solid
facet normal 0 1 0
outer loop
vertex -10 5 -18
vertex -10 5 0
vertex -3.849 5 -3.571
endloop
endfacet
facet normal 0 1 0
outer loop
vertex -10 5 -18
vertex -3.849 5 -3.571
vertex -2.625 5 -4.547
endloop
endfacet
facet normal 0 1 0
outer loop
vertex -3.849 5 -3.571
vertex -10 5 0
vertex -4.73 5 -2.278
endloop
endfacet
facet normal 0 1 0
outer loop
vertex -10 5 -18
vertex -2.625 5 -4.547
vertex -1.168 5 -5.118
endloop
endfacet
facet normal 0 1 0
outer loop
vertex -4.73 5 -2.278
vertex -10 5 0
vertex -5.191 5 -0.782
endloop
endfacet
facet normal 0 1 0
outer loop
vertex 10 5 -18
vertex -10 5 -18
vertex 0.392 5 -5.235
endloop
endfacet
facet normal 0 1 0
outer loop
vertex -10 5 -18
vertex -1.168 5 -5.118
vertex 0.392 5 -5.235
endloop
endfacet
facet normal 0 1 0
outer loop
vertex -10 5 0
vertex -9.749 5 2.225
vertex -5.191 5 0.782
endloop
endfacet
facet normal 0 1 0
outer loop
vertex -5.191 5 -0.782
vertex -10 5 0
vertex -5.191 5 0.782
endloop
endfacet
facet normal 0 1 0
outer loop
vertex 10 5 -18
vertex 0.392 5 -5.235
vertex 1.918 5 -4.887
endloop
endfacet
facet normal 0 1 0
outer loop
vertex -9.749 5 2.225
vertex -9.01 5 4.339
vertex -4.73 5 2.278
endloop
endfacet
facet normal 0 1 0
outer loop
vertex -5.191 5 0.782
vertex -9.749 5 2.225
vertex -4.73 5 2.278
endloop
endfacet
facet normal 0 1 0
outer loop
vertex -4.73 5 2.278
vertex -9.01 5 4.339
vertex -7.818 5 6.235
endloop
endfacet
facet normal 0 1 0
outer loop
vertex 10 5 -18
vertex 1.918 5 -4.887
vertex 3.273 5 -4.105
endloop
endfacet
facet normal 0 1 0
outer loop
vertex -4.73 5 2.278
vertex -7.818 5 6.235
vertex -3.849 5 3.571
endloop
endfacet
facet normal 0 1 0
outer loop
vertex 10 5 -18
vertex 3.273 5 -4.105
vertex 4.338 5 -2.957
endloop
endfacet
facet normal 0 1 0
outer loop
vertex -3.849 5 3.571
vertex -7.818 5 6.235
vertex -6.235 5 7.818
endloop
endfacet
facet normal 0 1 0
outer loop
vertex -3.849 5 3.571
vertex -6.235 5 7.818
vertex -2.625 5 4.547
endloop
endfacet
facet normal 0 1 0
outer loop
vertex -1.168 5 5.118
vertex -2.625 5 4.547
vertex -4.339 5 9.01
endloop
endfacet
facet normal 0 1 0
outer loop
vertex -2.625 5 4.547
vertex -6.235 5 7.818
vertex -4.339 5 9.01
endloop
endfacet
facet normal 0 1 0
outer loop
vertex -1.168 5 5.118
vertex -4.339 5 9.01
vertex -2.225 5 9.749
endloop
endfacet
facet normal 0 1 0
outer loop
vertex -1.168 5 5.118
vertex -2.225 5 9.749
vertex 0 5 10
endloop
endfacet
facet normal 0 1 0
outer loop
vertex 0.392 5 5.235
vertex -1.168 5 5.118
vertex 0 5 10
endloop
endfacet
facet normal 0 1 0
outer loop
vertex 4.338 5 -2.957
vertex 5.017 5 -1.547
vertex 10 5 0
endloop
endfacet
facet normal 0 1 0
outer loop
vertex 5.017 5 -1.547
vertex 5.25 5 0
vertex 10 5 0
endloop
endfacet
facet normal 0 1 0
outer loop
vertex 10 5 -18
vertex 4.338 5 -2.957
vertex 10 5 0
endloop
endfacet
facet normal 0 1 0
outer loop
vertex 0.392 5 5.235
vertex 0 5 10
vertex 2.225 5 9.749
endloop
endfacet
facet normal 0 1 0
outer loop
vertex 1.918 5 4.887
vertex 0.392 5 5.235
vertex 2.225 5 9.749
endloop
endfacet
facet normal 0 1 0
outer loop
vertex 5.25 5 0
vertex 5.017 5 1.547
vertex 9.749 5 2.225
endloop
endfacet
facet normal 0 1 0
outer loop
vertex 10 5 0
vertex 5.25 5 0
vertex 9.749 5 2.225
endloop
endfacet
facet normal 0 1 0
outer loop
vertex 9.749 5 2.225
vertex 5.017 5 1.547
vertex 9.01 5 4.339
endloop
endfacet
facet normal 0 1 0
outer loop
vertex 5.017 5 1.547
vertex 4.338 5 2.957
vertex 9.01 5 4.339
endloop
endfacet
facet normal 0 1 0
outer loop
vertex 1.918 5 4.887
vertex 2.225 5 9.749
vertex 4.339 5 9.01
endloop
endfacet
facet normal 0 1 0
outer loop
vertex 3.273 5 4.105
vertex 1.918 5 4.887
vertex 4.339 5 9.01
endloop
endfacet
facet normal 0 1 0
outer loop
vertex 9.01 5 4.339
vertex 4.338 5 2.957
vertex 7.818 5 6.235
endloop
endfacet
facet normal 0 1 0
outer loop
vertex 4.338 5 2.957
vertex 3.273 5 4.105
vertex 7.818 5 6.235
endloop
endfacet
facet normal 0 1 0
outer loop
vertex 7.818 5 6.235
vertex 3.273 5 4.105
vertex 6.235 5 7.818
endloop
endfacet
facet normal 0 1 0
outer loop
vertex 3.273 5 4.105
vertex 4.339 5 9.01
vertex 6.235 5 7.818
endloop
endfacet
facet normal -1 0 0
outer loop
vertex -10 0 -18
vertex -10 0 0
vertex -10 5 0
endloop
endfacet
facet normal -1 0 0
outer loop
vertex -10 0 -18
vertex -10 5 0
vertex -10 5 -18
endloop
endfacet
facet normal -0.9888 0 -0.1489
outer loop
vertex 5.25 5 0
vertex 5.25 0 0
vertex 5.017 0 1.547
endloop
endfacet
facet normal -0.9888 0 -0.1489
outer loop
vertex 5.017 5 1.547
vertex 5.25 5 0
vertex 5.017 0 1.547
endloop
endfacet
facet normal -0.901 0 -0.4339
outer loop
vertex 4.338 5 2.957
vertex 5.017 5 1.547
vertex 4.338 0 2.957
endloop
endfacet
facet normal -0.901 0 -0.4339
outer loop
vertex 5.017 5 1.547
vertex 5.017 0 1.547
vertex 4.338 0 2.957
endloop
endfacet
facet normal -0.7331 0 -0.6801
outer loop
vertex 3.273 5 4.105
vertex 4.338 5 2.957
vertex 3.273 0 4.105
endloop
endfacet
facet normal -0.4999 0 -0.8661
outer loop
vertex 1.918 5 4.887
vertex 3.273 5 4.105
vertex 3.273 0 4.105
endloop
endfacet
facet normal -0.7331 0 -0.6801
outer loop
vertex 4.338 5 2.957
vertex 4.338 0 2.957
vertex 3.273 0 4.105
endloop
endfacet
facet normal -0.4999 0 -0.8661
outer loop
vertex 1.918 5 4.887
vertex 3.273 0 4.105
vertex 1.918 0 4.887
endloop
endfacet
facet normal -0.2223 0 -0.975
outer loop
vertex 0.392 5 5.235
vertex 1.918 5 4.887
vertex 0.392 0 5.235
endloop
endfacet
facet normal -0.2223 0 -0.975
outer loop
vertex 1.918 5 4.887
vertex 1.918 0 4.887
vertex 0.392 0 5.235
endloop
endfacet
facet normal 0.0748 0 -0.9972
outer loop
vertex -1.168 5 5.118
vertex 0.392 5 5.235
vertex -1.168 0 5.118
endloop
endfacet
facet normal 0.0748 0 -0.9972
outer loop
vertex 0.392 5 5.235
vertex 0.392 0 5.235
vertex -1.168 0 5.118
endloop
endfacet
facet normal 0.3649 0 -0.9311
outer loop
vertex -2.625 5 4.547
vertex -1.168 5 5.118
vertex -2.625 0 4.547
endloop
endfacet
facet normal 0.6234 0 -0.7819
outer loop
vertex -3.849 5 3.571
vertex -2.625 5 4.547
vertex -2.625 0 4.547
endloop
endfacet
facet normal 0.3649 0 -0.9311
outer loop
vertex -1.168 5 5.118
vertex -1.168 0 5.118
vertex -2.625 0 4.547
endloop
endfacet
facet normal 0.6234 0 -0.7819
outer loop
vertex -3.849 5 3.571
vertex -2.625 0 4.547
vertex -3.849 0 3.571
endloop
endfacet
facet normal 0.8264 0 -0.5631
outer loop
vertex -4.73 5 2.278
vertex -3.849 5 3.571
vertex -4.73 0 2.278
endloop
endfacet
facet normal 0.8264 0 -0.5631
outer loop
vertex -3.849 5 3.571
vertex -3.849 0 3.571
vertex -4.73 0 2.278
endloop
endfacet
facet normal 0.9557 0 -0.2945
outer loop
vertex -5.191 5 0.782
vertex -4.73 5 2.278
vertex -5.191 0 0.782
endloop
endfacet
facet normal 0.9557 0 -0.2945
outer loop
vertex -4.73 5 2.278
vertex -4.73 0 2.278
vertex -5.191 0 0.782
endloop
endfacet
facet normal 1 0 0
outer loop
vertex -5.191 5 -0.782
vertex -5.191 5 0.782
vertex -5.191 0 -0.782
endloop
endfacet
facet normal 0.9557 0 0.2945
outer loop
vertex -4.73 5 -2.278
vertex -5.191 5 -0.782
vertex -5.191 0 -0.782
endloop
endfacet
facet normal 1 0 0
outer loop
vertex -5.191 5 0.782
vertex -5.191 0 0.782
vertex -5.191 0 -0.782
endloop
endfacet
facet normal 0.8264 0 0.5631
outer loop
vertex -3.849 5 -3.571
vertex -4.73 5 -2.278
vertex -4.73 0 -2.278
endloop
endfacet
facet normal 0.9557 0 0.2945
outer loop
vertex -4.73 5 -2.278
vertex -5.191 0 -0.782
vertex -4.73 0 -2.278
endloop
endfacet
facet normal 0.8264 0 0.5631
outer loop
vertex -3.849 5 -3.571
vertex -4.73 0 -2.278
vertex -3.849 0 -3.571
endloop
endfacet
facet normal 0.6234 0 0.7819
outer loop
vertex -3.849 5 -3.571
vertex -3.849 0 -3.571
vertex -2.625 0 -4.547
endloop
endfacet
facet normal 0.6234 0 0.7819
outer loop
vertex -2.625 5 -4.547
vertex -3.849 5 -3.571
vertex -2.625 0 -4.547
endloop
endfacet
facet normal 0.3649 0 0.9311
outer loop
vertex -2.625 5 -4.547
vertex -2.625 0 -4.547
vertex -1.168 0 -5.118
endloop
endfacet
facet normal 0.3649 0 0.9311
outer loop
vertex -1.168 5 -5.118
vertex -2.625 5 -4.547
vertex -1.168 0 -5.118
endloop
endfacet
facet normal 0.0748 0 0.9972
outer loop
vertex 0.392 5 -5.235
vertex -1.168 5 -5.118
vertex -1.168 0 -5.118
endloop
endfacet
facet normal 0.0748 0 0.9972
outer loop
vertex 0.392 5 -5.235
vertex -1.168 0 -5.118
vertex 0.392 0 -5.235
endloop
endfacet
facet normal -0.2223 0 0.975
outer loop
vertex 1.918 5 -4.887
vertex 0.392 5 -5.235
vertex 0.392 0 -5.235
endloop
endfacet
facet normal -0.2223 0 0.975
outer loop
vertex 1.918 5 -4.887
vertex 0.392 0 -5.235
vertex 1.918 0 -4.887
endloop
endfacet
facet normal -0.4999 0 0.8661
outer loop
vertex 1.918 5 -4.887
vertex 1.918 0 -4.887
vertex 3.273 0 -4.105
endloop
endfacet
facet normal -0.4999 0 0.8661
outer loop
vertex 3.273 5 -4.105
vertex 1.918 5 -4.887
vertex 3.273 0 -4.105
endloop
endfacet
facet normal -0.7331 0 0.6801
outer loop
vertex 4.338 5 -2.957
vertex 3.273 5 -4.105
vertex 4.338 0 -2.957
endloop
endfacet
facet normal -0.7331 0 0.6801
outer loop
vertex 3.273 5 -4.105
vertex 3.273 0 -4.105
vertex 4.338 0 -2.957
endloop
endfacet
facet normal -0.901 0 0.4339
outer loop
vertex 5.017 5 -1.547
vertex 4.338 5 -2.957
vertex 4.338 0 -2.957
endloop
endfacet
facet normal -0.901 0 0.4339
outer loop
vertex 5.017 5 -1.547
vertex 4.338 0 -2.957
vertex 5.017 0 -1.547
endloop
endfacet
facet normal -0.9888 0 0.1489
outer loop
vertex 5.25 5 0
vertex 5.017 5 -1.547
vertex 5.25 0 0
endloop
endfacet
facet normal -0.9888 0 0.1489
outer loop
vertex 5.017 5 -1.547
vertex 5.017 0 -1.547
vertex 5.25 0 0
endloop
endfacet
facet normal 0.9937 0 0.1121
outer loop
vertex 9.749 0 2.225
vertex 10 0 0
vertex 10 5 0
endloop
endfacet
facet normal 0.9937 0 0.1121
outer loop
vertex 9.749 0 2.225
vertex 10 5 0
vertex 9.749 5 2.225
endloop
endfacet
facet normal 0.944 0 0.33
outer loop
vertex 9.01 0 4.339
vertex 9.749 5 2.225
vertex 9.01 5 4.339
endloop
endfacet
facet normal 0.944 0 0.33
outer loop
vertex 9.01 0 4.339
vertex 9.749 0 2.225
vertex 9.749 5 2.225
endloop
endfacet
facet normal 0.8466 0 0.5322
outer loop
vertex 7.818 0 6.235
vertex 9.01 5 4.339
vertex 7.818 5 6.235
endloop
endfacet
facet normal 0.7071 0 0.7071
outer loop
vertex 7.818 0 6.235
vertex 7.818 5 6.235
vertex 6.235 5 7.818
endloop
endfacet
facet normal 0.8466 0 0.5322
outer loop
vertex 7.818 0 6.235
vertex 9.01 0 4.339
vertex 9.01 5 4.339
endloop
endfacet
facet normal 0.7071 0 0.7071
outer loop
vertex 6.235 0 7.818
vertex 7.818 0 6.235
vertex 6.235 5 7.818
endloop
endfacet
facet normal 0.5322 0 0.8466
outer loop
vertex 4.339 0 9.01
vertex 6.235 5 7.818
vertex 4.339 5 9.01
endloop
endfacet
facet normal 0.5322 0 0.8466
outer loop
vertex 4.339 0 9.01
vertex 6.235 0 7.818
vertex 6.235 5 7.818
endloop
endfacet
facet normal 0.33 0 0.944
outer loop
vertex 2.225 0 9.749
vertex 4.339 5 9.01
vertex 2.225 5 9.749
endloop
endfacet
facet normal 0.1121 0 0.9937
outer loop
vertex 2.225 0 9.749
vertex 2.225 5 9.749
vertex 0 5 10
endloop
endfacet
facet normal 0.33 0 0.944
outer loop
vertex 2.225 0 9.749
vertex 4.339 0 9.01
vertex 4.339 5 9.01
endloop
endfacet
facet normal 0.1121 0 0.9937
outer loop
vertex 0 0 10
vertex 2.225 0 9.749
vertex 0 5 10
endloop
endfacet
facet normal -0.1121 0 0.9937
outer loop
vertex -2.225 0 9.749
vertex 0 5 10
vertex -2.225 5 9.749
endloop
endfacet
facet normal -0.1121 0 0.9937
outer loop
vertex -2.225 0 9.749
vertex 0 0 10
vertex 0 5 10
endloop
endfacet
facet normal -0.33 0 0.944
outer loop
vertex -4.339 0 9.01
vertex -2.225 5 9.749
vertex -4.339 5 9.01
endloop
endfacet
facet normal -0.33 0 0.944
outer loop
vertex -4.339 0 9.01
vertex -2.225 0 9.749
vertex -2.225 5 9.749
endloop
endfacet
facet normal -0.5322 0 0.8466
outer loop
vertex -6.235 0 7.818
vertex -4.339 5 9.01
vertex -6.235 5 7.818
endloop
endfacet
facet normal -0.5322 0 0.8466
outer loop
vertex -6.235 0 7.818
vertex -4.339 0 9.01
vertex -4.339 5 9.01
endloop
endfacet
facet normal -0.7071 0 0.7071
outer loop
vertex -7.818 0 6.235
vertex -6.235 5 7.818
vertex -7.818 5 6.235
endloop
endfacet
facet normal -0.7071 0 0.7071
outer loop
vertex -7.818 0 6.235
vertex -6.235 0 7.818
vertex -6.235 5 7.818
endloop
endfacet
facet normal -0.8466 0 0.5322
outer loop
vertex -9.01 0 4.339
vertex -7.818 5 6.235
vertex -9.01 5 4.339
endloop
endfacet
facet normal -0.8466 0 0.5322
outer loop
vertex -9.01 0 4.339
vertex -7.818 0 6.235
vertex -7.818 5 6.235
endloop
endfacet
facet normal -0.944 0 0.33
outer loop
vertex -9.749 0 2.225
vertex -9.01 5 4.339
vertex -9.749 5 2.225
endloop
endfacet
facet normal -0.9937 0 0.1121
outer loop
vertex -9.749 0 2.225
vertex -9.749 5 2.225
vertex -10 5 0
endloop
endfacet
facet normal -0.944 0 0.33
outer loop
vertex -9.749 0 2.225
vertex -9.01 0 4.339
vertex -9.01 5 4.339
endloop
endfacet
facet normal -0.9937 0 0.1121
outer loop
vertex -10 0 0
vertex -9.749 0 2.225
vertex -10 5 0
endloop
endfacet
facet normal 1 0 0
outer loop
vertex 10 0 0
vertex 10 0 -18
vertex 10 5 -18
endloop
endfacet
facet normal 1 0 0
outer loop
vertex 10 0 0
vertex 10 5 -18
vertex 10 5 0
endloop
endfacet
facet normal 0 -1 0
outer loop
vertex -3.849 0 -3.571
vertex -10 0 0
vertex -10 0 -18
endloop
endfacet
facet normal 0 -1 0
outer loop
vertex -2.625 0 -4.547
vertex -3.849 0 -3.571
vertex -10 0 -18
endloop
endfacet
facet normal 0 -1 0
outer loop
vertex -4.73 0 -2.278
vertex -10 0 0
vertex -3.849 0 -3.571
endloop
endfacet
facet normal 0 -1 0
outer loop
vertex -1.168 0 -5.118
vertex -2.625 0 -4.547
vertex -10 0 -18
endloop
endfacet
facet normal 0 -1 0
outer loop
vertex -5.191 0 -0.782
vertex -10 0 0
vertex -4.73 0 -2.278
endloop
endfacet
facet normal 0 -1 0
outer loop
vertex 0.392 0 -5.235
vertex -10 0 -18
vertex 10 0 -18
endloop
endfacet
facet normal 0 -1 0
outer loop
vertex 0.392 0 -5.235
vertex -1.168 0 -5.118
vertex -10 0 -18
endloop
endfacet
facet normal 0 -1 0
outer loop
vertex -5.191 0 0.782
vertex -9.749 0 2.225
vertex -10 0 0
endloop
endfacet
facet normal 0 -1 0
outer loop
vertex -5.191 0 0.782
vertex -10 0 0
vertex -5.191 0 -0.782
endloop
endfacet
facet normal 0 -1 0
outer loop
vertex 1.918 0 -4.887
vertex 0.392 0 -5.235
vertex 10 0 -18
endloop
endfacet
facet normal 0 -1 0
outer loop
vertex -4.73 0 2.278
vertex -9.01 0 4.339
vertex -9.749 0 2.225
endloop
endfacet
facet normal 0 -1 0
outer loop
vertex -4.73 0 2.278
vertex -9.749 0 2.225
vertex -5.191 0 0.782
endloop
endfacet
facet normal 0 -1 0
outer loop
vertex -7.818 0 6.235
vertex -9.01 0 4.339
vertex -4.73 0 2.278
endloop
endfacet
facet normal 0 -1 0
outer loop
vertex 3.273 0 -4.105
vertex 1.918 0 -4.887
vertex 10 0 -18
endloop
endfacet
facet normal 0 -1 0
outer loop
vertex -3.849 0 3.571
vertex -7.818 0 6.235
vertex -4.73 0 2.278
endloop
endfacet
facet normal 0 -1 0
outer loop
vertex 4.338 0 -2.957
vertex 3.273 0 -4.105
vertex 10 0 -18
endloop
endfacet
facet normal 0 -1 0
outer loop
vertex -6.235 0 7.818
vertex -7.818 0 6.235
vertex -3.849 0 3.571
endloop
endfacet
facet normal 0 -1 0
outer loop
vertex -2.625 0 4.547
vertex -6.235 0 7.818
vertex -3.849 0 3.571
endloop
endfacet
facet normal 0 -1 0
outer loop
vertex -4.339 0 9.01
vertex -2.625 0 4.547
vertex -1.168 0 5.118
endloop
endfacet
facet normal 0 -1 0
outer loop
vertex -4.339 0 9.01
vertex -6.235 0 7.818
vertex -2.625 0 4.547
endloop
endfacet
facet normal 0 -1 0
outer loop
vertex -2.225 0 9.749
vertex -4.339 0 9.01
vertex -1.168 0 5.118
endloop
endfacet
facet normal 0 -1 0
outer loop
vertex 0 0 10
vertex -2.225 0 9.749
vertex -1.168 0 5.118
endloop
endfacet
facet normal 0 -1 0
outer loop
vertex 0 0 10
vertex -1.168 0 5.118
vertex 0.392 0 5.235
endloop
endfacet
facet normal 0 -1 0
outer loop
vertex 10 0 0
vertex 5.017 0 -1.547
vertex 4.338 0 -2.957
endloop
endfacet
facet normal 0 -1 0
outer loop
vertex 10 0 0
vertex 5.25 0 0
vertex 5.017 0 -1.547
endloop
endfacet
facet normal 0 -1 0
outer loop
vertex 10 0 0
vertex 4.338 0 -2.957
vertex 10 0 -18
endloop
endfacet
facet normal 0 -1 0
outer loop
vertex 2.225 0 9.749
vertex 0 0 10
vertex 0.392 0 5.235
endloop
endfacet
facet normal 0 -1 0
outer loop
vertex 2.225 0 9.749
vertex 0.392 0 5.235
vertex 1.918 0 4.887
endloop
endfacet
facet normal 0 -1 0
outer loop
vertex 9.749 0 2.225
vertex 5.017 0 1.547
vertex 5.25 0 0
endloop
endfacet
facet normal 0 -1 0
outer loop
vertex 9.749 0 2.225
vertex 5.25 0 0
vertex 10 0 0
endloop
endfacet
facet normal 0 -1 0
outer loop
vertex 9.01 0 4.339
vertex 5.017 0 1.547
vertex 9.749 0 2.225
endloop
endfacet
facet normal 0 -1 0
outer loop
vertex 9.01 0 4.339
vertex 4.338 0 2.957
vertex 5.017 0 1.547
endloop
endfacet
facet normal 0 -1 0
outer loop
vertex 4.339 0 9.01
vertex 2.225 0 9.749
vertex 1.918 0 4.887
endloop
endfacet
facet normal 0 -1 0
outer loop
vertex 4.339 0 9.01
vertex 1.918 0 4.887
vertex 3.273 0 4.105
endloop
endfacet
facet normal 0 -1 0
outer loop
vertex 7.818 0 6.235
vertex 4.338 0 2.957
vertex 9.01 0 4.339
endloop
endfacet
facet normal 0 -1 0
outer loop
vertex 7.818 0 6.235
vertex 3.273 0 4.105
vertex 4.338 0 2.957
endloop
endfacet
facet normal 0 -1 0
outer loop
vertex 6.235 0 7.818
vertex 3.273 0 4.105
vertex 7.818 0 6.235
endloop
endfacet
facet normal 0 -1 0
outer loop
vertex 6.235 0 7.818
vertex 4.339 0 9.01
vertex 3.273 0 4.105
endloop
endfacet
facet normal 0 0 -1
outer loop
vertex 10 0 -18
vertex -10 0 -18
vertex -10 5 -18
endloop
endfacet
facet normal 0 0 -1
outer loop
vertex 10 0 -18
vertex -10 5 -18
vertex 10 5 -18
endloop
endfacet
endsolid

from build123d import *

# Parameters (mm, degrees)
F0_R     = 5.25
F1_DEPTH = 5


with BuildPart() as f1:
    # F0 (on Front) → F1 (new body)
    with BuildSketch(Plane.XZ):
        with BuildLine():
            Line((10, -18), (10, 0))
            ThreePointArc((10, 0), (0, -10), (-10, 0))
            Line((-10, 0), (-10, -18))
            Line((-10, -18), (10, -18))
        make_face()
        with BuildLine():
            ThreePointArc((-10, 0), (0, -10), (10, 0))
            ThreePointArc((10, 0), (0, 10), (-10, 0))
        make_face()
        Circle(F0_R, mode=Mode.SUBTRACT)
    extrude(amount=-F1_DEPTH)


solid = f1.part
